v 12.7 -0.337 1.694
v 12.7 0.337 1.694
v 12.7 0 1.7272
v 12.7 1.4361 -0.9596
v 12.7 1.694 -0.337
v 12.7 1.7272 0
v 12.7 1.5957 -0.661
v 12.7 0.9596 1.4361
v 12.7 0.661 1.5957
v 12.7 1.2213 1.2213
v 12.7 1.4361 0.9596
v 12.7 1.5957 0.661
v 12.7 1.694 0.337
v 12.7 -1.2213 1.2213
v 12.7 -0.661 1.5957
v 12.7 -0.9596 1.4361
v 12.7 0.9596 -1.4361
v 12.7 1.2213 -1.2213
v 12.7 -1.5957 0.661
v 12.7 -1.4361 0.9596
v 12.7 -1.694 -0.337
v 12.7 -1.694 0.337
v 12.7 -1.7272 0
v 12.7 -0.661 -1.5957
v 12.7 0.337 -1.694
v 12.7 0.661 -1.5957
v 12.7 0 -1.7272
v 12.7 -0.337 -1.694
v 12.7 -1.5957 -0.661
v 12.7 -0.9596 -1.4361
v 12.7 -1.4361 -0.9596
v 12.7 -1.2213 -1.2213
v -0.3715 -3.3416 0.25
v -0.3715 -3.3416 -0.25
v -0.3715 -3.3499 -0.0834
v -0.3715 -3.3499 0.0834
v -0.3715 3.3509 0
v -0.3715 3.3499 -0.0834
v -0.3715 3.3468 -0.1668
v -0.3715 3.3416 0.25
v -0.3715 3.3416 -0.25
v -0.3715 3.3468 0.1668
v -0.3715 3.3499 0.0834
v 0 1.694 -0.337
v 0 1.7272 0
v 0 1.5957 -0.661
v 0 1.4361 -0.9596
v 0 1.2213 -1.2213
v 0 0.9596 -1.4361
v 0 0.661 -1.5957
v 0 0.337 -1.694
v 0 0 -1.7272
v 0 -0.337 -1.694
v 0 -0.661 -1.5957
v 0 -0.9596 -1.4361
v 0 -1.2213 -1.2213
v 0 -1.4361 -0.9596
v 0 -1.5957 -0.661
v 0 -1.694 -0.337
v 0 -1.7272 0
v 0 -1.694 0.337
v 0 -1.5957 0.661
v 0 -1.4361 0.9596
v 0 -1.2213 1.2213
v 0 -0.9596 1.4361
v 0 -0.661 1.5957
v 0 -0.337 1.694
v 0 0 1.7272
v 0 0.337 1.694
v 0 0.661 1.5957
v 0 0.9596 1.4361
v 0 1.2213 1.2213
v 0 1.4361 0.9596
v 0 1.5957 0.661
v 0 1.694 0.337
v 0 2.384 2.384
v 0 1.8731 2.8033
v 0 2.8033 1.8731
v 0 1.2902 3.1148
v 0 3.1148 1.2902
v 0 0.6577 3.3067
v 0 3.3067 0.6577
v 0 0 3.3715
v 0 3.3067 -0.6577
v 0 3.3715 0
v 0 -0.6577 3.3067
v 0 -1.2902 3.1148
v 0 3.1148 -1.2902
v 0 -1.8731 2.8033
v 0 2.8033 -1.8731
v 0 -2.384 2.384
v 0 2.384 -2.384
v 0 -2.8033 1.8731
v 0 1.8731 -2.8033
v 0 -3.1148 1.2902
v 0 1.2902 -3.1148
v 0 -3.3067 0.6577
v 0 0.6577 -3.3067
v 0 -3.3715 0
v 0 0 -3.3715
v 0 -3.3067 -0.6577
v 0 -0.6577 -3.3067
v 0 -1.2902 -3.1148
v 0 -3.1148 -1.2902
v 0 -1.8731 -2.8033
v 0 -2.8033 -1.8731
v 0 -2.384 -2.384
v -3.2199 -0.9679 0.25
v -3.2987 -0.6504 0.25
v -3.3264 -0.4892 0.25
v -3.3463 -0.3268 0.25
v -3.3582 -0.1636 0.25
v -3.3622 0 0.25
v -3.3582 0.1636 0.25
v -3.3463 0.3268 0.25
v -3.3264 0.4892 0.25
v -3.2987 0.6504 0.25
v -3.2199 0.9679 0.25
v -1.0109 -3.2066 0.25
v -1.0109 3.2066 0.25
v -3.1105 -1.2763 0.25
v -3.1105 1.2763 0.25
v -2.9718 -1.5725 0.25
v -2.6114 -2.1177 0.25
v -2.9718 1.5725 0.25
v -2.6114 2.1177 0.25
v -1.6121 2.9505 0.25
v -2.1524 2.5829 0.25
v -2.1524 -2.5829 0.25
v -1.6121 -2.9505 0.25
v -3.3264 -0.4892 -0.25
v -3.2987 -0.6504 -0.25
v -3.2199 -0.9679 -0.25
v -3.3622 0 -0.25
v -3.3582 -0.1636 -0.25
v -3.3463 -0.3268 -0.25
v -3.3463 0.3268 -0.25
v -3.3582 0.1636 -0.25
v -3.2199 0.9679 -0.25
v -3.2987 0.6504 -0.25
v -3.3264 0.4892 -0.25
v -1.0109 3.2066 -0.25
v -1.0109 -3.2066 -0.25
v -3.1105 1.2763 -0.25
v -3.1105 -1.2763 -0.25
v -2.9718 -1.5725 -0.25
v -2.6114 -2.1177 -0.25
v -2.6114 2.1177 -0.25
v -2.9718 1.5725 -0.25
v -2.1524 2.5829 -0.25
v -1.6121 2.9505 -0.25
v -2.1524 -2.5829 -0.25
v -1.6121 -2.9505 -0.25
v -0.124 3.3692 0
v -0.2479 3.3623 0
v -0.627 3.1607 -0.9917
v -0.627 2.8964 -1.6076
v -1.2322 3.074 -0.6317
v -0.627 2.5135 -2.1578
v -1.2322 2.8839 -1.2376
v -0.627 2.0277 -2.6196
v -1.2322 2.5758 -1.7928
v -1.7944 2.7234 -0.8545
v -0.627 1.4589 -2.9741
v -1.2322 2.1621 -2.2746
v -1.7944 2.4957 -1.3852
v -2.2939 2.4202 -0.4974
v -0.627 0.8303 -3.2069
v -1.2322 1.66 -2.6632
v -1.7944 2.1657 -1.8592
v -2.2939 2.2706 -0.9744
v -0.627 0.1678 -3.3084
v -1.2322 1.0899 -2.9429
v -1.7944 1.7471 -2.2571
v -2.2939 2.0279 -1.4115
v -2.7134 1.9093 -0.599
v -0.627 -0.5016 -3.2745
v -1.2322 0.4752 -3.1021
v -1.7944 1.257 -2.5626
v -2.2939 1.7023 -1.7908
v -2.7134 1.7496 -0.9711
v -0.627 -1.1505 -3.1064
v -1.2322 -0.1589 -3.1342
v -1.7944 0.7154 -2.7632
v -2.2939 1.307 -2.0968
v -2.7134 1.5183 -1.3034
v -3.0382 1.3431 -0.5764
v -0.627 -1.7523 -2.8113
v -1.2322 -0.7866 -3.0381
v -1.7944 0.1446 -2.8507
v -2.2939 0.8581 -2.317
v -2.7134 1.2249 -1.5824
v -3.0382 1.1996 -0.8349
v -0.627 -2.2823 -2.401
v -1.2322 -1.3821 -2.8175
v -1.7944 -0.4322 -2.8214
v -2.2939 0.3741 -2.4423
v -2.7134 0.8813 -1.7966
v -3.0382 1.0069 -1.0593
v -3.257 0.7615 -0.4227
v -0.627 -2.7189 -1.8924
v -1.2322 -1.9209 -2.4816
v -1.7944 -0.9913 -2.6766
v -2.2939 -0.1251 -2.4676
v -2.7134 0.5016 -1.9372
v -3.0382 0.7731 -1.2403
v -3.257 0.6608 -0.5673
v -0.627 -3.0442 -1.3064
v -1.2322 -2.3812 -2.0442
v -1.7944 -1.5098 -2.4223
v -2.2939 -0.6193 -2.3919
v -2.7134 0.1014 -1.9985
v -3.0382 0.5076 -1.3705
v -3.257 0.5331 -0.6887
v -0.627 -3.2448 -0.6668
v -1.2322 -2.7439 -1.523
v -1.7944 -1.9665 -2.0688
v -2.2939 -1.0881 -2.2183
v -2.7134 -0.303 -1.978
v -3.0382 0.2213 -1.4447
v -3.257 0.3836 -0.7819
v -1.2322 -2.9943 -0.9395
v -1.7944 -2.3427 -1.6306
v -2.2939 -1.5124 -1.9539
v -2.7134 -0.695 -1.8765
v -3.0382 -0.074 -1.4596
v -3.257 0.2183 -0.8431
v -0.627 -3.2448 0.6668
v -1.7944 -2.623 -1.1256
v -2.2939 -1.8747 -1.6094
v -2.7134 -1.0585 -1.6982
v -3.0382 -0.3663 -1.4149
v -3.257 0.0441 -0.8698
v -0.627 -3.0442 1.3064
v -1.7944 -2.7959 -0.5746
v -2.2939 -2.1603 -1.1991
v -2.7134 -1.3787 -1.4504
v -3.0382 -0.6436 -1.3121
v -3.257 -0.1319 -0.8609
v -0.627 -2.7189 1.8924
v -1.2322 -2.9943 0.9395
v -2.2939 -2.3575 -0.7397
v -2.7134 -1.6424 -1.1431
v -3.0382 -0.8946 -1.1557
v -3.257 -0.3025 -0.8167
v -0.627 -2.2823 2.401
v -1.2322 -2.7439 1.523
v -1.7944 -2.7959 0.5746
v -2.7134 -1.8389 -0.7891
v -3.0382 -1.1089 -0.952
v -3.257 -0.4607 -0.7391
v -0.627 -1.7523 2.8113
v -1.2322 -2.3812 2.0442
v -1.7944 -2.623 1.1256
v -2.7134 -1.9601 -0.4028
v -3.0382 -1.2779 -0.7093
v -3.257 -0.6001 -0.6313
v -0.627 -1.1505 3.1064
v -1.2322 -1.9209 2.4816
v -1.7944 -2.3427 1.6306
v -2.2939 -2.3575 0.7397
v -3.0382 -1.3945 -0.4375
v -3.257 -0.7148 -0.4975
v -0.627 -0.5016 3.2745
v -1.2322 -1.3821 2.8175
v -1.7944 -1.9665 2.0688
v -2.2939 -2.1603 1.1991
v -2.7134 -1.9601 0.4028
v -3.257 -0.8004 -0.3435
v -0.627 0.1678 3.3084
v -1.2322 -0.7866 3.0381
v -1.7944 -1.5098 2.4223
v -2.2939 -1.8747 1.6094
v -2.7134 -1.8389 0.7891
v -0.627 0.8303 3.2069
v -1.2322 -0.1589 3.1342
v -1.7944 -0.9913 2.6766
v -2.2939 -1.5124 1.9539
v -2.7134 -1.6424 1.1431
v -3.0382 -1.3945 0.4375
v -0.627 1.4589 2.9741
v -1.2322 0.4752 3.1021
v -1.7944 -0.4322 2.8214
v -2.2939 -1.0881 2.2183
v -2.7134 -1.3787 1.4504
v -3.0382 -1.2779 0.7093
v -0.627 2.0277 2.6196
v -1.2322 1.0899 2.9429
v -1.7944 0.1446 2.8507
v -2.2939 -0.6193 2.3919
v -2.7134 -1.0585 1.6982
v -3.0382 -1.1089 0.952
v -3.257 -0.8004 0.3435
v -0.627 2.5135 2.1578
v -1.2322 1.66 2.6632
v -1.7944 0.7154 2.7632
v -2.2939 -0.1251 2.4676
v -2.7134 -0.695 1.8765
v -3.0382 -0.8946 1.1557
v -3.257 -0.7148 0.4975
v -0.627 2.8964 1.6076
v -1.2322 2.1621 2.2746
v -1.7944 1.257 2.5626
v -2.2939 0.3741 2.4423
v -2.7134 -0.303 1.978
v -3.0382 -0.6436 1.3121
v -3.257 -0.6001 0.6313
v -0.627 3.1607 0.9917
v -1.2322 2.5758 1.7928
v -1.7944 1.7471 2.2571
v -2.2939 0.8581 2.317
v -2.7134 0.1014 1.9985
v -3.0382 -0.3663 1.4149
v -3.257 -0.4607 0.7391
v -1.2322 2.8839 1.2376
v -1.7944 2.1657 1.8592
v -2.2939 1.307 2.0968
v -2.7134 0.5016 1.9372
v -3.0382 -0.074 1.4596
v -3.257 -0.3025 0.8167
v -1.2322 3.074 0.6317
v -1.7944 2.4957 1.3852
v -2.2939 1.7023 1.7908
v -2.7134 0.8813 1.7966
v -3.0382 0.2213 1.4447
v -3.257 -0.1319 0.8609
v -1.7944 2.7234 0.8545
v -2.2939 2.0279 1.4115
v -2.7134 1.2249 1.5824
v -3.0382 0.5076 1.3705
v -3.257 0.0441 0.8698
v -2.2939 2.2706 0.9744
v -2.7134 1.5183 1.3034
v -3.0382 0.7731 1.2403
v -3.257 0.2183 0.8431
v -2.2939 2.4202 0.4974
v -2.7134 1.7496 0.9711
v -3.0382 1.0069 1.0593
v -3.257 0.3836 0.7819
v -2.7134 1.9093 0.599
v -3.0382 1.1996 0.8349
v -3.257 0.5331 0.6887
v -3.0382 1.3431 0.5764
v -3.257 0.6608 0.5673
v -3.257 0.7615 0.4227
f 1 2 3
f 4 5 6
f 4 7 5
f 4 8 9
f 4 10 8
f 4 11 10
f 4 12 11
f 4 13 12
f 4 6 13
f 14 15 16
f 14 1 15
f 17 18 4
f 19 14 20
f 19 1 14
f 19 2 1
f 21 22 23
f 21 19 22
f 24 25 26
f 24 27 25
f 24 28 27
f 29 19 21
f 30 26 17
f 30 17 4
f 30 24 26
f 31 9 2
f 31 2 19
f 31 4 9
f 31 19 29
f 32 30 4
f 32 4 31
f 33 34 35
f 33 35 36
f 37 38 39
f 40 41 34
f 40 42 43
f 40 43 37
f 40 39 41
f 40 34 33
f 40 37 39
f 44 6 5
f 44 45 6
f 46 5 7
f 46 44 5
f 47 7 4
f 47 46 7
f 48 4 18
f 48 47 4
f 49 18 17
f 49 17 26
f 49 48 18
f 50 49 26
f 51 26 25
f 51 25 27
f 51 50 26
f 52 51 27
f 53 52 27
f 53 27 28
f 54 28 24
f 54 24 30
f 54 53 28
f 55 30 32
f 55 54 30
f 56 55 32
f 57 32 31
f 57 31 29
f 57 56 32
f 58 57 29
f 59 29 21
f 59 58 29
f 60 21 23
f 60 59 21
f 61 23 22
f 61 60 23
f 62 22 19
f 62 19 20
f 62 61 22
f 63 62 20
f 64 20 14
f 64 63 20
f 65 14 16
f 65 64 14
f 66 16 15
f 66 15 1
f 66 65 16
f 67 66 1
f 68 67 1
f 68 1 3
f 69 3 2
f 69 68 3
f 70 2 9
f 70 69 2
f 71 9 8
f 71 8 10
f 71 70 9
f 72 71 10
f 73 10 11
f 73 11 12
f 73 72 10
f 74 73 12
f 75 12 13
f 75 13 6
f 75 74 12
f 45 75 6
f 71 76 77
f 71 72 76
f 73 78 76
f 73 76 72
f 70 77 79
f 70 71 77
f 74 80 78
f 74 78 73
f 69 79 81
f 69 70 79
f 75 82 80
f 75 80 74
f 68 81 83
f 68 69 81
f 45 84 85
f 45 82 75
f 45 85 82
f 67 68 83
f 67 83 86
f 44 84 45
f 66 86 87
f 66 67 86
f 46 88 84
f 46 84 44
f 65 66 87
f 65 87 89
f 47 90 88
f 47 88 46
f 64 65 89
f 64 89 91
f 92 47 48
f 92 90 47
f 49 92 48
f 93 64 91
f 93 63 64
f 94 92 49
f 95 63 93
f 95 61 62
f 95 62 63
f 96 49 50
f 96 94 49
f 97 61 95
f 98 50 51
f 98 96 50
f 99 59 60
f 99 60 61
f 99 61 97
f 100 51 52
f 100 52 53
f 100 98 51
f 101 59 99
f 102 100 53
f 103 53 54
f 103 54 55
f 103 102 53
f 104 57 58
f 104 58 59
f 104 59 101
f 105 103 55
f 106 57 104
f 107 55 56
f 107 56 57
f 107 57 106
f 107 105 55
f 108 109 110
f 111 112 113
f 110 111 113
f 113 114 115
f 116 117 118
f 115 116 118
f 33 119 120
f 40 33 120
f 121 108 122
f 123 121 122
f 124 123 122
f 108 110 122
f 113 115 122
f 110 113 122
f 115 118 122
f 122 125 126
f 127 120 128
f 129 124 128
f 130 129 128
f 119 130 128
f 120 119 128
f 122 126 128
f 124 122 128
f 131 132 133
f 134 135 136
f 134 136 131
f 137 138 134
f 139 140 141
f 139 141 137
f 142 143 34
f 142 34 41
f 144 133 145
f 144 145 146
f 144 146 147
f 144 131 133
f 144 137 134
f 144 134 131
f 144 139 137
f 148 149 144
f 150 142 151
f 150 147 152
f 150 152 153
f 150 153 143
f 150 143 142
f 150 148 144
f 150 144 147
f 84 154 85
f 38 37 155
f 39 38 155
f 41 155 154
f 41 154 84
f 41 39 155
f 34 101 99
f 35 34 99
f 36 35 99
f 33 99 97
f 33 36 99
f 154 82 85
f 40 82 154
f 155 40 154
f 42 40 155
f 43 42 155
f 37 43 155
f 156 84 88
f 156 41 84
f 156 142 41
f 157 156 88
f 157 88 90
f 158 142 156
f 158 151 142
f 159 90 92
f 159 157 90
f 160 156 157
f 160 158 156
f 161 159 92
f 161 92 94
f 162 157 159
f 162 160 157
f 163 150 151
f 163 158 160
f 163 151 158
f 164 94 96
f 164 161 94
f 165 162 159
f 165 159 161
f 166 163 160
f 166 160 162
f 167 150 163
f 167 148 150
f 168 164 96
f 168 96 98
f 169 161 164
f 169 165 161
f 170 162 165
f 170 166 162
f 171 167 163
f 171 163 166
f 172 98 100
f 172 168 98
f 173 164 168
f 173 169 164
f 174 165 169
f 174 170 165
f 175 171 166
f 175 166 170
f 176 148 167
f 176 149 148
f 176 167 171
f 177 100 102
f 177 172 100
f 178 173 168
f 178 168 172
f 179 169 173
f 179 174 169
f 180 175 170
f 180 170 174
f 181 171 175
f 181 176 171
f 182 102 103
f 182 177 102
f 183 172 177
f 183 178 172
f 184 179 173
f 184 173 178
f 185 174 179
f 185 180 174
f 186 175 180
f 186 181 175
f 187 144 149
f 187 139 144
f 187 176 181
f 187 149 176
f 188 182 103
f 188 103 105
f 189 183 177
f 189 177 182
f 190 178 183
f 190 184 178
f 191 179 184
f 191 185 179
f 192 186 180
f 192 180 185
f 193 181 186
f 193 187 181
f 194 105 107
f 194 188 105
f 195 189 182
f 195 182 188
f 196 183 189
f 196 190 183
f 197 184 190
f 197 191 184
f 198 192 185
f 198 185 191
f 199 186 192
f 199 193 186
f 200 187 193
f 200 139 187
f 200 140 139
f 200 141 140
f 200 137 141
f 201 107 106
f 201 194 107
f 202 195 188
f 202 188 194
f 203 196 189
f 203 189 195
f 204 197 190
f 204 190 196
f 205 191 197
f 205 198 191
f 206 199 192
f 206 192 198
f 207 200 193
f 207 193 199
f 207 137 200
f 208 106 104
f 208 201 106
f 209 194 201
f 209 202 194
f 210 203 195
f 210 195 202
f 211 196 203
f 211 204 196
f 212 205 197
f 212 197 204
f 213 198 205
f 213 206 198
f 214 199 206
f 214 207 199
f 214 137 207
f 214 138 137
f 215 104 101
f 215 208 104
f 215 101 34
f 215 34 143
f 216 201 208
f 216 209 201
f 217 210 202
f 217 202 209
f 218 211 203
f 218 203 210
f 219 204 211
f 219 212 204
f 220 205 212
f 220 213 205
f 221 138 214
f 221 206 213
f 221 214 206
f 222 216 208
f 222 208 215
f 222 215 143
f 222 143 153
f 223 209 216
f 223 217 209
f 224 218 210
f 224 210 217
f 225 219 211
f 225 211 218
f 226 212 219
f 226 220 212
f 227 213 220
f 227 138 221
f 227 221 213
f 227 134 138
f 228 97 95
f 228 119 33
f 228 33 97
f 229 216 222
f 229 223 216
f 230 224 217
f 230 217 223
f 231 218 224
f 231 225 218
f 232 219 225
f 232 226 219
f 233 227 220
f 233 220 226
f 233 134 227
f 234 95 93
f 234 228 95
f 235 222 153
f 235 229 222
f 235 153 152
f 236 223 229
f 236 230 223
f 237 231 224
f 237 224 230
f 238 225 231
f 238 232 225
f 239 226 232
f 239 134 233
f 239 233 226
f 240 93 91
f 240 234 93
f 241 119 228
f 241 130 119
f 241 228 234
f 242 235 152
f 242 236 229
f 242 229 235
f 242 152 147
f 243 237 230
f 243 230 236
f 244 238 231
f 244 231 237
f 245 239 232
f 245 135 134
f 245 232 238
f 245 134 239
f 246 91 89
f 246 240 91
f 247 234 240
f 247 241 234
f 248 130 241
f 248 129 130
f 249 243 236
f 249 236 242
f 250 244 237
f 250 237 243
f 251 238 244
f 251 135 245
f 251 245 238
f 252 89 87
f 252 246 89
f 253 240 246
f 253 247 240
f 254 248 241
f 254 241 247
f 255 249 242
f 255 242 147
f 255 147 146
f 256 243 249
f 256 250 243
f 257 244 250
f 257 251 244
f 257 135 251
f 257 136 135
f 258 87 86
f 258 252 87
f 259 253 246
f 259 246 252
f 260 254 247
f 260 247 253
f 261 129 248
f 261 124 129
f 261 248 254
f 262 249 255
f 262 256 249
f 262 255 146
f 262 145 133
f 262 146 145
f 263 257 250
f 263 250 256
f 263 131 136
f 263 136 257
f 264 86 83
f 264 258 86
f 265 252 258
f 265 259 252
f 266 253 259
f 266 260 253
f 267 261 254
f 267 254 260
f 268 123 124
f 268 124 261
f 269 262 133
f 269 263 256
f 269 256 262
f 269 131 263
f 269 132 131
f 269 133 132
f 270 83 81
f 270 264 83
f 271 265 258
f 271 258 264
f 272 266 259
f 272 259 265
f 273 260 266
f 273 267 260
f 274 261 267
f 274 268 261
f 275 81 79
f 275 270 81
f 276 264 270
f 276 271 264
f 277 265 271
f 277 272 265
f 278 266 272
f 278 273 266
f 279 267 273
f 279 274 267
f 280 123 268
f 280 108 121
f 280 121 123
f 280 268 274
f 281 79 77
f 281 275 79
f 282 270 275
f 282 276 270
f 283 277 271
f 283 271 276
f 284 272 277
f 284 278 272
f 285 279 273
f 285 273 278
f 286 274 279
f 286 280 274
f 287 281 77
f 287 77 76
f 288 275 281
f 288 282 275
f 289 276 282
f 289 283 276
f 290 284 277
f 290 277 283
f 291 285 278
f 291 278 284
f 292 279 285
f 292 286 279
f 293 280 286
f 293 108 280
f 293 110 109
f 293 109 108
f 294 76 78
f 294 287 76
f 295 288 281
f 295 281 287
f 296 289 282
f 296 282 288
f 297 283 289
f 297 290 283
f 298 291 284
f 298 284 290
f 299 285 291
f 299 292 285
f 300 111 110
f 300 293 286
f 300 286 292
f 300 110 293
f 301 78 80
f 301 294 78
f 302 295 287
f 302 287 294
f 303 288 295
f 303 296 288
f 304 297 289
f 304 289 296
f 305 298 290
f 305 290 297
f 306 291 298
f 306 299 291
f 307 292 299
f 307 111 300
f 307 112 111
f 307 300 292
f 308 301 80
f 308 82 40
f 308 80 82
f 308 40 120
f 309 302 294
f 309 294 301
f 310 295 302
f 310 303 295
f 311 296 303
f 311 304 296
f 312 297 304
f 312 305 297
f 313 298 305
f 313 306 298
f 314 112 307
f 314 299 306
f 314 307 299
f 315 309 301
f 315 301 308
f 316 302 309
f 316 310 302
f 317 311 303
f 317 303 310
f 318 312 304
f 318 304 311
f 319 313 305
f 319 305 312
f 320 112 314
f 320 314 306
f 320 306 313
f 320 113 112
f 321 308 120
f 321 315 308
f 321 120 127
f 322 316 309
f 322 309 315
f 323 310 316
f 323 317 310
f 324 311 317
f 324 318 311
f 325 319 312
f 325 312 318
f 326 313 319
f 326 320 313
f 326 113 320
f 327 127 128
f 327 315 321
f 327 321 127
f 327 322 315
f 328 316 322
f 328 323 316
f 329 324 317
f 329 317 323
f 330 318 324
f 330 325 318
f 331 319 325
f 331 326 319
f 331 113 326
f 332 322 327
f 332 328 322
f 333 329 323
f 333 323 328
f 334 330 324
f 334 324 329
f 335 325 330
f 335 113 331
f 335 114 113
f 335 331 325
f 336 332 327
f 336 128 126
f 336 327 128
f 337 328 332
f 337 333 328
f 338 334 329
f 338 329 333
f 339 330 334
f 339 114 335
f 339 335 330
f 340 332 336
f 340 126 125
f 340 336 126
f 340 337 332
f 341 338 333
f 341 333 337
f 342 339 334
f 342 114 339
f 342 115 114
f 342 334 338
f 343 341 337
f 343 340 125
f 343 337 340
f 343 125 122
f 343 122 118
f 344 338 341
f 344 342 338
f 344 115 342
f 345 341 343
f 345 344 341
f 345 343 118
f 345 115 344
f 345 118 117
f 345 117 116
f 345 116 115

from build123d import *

# Parameters (mm, degrees)
SKETCH2_W          = 0.5
SKETCH2_H          = 8.749412665
CUT_EXTRUDE1_DEPTH = 3


with BuildPart() as part:
    # Sketch1 → Revolve3 (revolve)
    with BuildSketch(Plane.XY):
        with BuildLine():
            Line((12.7, 0), (12.7, 1.7272))
            Line((12.7, 1.7272), (0, 1.7272))
            Line((0, 1.7272), (0, 3.371476925))
            ThreePointArc((0, 3.371476925), (-2.383994197, 2.383994197), (-3.371476925, 0))
            Line((-3.371476925, 0), (12.7, 0))
        make_face()
    revolve(axis=Axis((25.331759203, 0, 0), (-1, 0, 0)))

    # Sketch2 → Cut-Extrude1 (cut)
    with BuildSketch(Plane.ZY.offset(3.371476925)):
        with Locations((0, -0.032949338)):
            Rectangle(SKETCH2_W, SKETCH2_H)
    extrude(amount=-CUT_EXTRUDE1_DEPTH, mode=Mode.SUBTRACT)


solid = part.part
